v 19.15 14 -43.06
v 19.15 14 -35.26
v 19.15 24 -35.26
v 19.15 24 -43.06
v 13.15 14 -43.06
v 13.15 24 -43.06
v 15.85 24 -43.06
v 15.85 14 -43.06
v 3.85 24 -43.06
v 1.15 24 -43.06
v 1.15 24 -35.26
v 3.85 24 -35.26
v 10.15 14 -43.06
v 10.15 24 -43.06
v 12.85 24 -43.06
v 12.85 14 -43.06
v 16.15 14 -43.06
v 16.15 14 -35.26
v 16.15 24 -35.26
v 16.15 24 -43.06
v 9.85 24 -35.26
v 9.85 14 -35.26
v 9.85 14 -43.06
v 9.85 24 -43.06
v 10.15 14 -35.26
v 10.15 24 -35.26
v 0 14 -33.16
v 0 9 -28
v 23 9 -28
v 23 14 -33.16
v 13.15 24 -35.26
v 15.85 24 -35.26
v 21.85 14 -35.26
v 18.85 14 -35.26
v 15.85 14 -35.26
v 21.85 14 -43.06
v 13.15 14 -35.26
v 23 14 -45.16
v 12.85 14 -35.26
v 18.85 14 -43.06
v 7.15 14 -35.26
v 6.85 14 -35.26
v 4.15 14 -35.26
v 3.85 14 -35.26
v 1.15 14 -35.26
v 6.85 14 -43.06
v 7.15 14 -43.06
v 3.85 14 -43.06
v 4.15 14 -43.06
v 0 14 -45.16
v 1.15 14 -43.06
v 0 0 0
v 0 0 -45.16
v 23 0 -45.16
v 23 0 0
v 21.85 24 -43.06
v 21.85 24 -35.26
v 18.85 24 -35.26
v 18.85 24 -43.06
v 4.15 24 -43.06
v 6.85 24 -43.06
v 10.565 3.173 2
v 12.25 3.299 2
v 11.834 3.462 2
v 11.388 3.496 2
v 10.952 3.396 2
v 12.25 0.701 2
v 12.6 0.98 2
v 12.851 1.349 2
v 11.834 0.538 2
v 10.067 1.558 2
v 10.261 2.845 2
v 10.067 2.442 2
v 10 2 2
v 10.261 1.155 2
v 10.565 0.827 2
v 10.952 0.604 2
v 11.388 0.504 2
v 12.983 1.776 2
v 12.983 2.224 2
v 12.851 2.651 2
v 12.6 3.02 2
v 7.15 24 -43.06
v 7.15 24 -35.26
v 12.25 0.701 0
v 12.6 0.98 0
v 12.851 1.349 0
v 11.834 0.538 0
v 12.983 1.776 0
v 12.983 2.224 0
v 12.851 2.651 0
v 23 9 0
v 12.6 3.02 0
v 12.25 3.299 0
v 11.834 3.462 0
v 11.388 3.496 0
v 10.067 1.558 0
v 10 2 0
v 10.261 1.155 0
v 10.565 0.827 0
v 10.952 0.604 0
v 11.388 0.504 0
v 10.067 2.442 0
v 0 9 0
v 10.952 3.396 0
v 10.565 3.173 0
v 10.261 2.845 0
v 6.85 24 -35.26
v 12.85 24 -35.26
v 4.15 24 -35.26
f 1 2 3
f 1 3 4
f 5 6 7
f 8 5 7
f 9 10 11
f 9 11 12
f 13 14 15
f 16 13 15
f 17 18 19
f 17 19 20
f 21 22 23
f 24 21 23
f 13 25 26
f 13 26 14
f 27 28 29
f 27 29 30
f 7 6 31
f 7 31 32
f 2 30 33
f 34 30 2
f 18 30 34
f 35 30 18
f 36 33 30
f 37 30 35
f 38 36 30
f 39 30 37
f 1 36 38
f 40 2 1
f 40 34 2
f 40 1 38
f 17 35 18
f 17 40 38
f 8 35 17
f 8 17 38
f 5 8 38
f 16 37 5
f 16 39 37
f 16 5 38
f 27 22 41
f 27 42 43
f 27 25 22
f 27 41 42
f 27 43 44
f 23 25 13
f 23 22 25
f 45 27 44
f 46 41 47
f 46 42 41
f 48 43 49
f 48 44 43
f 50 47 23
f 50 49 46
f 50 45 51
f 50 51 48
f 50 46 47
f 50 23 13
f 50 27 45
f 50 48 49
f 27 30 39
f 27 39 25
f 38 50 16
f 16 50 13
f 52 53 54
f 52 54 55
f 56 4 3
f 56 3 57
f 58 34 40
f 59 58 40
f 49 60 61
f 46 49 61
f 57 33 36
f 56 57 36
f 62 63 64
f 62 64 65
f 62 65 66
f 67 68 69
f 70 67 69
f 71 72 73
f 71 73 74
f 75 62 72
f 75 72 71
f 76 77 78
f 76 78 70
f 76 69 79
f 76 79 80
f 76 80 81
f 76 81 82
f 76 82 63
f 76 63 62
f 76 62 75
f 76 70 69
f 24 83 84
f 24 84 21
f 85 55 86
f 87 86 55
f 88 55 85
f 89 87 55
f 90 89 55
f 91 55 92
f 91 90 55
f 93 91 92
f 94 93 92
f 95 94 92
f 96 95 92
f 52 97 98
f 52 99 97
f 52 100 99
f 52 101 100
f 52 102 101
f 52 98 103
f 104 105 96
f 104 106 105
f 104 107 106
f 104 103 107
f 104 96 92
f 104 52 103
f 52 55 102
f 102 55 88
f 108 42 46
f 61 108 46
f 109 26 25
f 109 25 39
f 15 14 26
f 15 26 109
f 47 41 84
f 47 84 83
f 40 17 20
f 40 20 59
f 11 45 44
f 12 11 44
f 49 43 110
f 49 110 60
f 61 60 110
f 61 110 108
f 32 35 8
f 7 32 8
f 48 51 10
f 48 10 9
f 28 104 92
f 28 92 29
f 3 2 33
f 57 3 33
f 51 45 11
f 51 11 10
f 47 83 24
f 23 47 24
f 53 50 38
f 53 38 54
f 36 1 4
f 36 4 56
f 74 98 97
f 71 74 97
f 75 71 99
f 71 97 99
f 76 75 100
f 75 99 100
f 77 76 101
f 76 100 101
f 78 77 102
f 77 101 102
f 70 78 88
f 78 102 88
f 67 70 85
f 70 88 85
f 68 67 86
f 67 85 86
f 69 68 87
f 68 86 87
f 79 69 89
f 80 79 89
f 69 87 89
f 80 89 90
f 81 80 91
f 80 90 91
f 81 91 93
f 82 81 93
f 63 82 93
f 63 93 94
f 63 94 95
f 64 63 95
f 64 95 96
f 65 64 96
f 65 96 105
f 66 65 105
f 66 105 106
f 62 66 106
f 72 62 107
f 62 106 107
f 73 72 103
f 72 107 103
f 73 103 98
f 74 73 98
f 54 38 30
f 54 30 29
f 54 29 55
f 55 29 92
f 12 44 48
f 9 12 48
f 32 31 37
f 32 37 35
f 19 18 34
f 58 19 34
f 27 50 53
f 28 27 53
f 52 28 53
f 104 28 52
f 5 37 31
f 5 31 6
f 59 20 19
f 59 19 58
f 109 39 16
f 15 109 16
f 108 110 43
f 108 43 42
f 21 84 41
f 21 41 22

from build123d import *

# Parameters (mm, degrees)
BOSS_EXTRUDE1_DEPTH = 23
SKETCH2_R           = 1.5
BOSS_EXTRUDE2_DEPTH = 2
SKETCH3_W           = 2.7
SKETCH3_H           = 7.8
BOSS_EXTRUDE3_DEPTH = 10


with BuildPart() as part:
    # Sketch1 → Boss-Extrude1 (new body)
    with BuildSketch(Plane(origin=(0, 0, 0), x_dir=(0, 0, -1), z_dir=(1, 0, 0))):
        Polygon((0, 0), (0, 9), (28, 9), (33.16, 14), (45.16, 14), (45.16, 0), align=None)
    extrude(amount=BOSS_EXTRUDE1_DEPTH)

    # Sketch2 → Boss-Extrude2 (add)
    with BuildSketch(Plane.XY):
        with Locations(Location((11.5, 2, 0), (0, 0, 180))):
            Circle(SKETCH2_R)
    extrude(amount=BOSS_EXTRUDE2_DEPTH)

    # Sketch3 → Boss-Extrude3 (add)
    with BuildSketch(Plane(origin=(0, 14, 0), x_dir=(1, 0, 0), z_dir=(0, 1, 0))):
        with Locations((14.5, 39.16)):
            Rectangle(SKETCH3_W, SKETCH3_H)
        with Locations((11.5, 39.16)):
            Rectangle(SKETCH3_W, SKETCH3_H)
        with Locations((17.5, 39.16)):
            Rectangle(SKETCH3_W, SKETCH3_H)
        with Locations((20.5, 39.16)):
            Rectangle(SKETCH3_W, SKETCH3_H)
        with Locations((8.5, 39.16)):
            Rectangle(SKETCH3_W, SKETCH3_H)
        with Locations((5.5, 39.16)):
            Rectangle(SKETCH3_W, SKETCH3_H)
        with Locations((2.5, 39.16)):
            Rectangle(SKETCH3_W, SKETCH3_H)
    extrude(amount=BOSS_EXTRUDE3_DEPTH)


solid = part.part
